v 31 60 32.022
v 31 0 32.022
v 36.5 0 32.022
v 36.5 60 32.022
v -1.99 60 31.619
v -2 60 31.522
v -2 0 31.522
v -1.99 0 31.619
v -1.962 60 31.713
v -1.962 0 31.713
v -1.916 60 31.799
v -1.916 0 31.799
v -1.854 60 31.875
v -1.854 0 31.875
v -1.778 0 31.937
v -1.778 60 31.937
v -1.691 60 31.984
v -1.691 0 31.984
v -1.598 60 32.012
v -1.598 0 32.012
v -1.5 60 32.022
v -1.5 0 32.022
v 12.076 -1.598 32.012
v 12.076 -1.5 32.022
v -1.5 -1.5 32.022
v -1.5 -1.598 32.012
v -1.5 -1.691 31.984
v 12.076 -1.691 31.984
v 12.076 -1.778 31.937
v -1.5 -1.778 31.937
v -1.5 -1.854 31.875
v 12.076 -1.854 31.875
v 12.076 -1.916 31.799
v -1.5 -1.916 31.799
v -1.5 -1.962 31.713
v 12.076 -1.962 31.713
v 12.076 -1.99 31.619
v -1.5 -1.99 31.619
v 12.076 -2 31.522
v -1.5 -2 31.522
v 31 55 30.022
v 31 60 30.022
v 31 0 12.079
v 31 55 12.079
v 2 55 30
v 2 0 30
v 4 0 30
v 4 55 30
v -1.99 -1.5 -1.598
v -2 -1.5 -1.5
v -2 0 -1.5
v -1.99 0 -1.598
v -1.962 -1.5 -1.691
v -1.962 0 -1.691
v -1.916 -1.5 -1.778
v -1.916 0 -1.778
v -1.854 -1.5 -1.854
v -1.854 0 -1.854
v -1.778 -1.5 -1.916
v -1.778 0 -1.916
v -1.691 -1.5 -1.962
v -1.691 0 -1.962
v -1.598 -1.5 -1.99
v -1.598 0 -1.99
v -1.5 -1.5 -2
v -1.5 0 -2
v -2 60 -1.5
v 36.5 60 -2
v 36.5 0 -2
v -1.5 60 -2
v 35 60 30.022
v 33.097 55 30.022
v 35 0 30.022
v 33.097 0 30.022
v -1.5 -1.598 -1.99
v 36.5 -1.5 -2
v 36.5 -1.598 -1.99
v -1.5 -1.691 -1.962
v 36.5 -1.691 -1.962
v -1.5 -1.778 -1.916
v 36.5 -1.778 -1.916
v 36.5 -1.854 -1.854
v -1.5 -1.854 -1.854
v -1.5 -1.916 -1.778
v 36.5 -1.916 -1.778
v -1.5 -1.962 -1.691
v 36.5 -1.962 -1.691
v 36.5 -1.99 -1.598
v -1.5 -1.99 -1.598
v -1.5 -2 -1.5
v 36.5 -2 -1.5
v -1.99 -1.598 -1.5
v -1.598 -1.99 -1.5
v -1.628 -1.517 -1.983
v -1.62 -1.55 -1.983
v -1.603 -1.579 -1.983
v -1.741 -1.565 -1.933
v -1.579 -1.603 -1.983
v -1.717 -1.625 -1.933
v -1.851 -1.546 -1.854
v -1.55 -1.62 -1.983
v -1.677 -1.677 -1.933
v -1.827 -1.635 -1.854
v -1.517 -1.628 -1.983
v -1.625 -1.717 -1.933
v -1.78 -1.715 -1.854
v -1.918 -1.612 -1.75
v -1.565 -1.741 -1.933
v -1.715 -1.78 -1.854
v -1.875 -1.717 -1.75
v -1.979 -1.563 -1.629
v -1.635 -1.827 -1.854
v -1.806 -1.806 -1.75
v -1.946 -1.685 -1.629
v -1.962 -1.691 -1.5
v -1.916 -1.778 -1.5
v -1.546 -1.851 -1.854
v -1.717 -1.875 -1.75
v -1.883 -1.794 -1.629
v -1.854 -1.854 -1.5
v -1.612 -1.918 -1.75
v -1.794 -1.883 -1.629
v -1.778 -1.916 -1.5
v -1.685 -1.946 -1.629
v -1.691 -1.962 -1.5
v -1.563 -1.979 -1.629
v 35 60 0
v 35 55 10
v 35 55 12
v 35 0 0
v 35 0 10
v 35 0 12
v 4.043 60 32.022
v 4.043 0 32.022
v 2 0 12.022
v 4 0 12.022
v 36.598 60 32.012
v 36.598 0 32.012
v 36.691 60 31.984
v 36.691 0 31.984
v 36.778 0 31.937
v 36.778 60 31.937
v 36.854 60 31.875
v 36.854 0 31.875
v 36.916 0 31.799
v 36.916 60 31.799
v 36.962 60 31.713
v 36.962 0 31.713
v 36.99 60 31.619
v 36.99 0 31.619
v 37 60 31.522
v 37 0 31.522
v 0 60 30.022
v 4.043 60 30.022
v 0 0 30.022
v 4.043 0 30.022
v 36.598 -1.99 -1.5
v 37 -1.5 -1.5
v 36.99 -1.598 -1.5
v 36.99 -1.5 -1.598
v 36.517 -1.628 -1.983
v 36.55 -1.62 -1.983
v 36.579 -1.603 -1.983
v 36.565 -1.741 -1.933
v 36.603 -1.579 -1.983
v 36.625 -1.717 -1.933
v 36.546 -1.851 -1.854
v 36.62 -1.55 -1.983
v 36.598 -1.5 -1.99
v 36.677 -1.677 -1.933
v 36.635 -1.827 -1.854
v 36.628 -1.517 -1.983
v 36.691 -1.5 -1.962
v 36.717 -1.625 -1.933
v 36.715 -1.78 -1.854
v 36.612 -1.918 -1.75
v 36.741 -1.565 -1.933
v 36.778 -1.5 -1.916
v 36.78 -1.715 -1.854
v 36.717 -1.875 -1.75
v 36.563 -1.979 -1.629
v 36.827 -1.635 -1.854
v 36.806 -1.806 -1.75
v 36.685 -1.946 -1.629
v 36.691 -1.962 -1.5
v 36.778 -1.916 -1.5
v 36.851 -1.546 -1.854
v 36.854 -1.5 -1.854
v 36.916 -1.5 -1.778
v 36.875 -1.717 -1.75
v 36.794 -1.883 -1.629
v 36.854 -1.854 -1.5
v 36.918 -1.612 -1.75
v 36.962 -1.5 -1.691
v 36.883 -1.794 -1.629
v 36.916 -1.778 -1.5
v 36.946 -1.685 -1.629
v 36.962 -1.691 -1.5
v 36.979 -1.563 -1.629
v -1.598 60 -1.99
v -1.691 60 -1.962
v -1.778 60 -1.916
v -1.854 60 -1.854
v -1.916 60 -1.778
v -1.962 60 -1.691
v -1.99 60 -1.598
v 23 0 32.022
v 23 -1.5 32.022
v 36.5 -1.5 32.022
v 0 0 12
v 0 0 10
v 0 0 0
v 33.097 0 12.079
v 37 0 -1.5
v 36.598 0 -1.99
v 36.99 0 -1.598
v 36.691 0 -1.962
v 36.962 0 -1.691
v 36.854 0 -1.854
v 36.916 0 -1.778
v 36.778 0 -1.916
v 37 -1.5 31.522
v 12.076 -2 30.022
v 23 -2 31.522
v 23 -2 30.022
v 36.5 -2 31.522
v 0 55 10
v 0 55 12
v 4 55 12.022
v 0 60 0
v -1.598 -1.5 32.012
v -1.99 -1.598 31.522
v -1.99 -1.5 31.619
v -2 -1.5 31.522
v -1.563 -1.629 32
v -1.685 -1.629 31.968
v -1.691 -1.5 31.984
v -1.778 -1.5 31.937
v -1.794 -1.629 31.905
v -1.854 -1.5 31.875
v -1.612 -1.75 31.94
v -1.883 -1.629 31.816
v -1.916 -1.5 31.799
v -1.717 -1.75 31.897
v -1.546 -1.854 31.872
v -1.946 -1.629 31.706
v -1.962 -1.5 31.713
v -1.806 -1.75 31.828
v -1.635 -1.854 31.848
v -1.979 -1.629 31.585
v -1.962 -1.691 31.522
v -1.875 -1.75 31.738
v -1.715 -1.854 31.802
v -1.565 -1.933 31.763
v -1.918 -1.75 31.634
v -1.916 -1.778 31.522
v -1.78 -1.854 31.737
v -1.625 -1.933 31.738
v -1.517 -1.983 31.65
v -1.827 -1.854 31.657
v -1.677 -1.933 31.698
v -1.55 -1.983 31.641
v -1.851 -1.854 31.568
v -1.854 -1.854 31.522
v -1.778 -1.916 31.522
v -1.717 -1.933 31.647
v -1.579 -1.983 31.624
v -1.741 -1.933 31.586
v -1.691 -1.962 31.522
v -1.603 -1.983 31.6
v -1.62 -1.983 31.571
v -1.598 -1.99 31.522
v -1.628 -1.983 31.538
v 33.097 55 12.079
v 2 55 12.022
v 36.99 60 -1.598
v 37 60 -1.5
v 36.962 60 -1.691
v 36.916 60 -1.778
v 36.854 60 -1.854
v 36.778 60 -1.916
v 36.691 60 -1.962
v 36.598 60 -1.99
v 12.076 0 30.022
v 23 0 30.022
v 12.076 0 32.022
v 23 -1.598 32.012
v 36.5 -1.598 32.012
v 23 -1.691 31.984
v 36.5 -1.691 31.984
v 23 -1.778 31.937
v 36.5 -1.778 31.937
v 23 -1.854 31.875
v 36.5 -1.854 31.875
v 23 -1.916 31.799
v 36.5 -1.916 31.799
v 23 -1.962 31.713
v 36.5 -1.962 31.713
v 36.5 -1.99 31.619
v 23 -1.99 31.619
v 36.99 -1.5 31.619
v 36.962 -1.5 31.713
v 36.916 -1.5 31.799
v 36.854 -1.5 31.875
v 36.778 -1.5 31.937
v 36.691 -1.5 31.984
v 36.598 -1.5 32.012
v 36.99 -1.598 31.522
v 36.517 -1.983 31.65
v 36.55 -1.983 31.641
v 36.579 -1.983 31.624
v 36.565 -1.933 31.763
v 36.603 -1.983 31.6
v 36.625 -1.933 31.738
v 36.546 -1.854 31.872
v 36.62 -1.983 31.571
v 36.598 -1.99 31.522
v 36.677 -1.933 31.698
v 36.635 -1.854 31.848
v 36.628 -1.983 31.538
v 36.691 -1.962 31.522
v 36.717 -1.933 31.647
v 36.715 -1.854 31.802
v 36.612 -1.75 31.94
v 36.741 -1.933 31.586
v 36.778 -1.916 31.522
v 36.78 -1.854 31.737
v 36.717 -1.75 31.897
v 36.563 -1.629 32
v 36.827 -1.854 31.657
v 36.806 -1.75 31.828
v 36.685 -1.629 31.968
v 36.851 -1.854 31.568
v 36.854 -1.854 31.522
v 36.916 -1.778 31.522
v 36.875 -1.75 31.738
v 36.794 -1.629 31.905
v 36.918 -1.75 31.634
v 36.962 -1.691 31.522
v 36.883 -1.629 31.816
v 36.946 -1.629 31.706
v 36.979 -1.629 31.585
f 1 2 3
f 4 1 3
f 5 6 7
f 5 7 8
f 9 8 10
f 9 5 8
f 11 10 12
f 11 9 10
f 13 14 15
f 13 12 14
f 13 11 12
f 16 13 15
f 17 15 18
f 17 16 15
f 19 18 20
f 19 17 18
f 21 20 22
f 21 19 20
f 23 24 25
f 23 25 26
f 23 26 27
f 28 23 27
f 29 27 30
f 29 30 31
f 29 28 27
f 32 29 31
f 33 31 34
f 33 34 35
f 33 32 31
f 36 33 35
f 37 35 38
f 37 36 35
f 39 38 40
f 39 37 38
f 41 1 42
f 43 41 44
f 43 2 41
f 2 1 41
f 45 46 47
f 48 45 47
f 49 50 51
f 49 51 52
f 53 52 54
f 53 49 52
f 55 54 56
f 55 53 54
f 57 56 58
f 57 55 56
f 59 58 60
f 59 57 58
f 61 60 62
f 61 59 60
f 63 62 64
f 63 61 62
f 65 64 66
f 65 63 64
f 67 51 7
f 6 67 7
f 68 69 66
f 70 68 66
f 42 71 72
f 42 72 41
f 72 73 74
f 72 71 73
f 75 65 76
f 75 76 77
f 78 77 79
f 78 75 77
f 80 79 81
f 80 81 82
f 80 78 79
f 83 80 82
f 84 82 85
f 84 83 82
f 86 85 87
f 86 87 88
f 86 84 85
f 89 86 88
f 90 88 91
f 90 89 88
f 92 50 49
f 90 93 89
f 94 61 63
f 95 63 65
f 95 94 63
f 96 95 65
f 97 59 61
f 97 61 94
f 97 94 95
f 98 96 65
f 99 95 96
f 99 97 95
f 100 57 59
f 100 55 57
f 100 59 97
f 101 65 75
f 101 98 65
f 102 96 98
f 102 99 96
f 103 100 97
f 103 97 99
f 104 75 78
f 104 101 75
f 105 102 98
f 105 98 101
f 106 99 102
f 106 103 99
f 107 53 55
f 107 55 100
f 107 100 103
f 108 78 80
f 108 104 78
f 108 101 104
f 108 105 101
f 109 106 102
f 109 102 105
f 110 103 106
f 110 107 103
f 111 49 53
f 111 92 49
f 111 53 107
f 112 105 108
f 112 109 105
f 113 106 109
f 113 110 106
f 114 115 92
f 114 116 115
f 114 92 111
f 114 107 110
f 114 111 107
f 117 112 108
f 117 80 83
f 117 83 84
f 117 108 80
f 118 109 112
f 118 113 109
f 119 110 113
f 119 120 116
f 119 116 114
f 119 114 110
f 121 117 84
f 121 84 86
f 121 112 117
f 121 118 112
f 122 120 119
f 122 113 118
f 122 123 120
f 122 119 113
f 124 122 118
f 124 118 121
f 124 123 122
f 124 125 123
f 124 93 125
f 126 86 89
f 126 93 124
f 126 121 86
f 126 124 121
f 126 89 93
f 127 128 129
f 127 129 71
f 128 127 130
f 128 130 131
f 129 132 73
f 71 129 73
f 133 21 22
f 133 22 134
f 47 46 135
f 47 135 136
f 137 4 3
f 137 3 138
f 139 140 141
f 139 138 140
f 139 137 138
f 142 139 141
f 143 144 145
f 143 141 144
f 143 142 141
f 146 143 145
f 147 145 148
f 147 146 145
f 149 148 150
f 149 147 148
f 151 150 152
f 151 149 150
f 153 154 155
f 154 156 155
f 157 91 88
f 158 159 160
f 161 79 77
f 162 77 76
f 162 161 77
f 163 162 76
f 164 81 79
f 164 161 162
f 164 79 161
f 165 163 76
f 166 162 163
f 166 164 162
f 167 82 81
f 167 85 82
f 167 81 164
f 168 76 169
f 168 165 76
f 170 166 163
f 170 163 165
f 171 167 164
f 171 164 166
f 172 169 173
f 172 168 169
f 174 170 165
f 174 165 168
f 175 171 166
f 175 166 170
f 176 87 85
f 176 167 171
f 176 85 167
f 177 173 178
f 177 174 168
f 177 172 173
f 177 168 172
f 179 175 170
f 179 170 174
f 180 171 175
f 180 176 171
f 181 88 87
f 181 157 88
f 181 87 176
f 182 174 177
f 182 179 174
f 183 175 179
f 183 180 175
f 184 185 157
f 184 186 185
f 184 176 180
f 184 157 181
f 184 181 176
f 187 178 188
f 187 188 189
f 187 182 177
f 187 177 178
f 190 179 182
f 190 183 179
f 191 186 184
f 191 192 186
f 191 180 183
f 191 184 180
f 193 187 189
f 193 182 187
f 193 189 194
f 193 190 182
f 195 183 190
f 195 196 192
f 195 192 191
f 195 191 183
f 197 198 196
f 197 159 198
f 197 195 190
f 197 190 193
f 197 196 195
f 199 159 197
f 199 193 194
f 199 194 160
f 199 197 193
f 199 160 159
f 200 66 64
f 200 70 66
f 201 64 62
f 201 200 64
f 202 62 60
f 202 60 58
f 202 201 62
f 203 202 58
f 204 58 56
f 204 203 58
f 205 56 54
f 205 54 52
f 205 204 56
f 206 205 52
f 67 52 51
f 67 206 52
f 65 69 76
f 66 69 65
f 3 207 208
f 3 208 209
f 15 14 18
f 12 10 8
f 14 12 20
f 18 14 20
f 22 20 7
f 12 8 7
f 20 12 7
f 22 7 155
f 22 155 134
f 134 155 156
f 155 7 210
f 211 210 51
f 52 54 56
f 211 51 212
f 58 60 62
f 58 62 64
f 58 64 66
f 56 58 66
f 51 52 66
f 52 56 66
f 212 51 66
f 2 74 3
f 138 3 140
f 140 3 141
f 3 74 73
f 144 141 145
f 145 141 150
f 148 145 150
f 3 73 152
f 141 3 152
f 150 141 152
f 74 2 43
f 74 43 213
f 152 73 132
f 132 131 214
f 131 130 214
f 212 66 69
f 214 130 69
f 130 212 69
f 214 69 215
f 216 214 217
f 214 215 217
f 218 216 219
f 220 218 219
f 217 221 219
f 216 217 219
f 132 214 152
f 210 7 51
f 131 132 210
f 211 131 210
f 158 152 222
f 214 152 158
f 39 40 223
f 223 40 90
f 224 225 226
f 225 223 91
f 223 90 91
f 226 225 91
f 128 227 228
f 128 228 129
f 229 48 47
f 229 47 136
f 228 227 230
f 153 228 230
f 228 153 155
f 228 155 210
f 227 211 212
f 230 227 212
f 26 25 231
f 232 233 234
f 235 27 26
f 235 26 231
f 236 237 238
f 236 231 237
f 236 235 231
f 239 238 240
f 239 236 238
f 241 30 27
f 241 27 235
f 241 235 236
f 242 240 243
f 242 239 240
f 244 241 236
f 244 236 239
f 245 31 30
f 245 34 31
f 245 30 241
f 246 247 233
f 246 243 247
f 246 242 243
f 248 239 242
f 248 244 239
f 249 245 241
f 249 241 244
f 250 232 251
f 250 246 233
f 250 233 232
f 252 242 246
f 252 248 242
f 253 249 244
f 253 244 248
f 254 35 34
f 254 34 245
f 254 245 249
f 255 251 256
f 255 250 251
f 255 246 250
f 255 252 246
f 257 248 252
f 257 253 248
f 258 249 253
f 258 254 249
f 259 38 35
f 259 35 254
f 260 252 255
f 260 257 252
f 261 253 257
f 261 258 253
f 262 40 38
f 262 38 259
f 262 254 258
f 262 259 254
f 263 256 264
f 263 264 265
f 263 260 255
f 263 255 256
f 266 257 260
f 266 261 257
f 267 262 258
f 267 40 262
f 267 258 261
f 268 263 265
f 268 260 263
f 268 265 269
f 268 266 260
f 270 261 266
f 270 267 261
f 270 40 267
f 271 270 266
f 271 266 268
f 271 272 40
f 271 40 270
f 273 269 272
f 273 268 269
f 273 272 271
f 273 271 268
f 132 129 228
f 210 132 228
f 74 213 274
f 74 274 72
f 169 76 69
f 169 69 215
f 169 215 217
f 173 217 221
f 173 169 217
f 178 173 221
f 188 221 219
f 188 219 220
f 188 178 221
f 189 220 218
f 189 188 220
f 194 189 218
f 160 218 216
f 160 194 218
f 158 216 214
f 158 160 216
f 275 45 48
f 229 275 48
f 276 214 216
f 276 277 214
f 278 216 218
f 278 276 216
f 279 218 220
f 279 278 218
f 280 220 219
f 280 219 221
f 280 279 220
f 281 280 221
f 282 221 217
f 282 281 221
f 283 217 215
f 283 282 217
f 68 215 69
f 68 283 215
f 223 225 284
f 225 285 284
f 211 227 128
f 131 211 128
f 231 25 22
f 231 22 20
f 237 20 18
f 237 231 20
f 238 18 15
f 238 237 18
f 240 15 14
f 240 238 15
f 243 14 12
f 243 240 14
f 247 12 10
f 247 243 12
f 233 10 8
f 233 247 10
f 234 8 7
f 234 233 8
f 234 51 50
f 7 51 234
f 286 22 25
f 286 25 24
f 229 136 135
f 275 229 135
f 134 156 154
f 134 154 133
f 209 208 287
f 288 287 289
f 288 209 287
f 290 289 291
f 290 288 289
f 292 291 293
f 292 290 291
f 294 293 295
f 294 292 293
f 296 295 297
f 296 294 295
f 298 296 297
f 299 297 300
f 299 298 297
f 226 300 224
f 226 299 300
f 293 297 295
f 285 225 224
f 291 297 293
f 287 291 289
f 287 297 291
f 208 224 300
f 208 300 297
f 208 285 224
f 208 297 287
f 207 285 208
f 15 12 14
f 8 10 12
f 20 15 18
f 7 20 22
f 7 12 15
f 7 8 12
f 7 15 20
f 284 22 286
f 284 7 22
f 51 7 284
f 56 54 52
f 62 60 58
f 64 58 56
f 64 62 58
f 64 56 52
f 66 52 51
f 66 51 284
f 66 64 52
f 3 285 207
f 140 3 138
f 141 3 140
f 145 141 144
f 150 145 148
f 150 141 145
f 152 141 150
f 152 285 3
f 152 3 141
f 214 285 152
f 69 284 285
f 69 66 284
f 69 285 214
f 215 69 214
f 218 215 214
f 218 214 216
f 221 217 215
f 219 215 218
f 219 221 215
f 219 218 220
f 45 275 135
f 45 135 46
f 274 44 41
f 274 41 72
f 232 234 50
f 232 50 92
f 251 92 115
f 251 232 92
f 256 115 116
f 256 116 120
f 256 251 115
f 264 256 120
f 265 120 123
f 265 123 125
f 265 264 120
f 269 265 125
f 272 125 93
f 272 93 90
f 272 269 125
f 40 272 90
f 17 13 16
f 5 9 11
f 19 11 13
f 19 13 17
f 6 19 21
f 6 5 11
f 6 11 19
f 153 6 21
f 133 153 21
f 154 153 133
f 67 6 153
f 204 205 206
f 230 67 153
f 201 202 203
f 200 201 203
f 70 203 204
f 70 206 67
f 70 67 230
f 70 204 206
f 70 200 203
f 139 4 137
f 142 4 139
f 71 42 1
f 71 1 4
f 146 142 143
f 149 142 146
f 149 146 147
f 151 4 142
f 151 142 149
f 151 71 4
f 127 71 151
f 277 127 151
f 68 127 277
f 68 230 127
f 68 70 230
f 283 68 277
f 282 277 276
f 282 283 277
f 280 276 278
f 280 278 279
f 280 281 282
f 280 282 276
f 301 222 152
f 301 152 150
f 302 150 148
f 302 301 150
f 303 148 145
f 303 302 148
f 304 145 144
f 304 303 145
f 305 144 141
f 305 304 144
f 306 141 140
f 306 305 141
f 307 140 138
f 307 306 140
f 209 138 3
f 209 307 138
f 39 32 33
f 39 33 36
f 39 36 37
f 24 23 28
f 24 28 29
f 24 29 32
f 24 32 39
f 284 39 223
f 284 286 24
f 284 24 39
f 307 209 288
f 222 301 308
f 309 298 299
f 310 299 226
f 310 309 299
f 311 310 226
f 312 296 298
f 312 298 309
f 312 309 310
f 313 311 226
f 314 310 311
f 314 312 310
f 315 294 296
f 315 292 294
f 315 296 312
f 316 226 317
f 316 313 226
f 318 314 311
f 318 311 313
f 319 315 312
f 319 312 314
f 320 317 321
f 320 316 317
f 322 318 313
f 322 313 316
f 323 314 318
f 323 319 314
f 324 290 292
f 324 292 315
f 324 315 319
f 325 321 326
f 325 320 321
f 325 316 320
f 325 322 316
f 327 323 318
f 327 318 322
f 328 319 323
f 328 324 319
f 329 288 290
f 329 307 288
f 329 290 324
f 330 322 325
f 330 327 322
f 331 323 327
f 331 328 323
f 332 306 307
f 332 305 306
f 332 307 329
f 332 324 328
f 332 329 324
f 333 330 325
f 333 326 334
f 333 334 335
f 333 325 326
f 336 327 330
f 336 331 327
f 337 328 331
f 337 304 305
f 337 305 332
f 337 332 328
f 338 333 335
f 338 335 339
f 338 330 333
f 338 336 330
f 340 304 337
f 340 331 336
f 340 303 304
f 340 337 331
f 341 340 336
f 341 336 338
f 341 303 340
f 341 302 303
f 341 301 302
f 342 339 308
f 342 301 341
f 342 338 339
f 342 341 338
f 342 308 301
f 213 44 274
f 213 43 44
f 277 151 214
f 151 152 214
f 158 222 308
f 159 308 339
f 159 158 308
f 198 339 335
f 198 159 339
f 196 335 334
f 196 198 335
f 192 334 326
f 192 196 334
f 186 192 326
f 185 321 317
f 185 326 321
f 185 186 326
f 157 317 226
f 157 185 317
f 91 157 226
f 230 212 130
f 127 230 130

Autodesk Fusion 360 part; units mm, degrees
sketch "Esquisse1" plane through (0, 0, 0) normal (0, 1, 0) x (1, 0, 0)
  line L0 (0, 0) -> (35, 0)
  line L1 (35, 0) -> (35, -10)
  line L2 (0, -10) -> (0, 0)
  line L3 (35, -10) -> (35, -30.0216)
  line L4 (35, -30.0216) -> (0, -30.0216)
  line L5 (0, -30.0216) -> (0, -10)
  line L6 (4, -30.0216) -> (4, -12.0216)
  line L7 (31, -30.0216) -> (31, -12.0794)
  line L8 (23, -32.0216) -> (12.0758, -32.0216)
  line L9 (12.0758, -32.0216) -> (12.0758, -30.0216)
  line L10 (12.0758, -30.0216) -> (23, -30.0216)
  line L11 (23, -30.0216) -> (23, -32.0216)
  line L12 (-2, -32.0216) -> (37, -32.0216)
  line L13 (37, -32.0216) -> (37, 2)
  line L14 (37, 2) -> (-2, 2)
  line L15 (-2, 2) -> (-2, -32.0216)
  line L16 (2, -30) -> (4, -30)
  line L17 (4, -30) -> (4, -12.0216)
  line L18 (4, -12.0216) -> (2, -12.0216)
  line L19 (2, -12.0216) -> (2, -30)
  line L20 (33.0971, -30.0216) -> (31, -30.0216)
  line L21 (31, -30.0216) -> (31, -12.0794)
  line L22 (31, -12.0794) -> (33.0971, -12.0794)
  line L23 (33.0971, -12.0794) -> (33.0971, -30.0216)
  line L24 (35, -10) -> (35, -12)
  line L25 (0, -12) -> (0, -10)
  line L26 (35, -12) -> (0, -12)
  line L27 (0, -12) -> (0, -10)
  line L28 (0, -10) -> (35, -10)
  line L29 (35, -10) -> (35, -12)
  line L30 (4.0433, -32.0216) -> (31, -32.0216)
  line L31 (31, -32.0216) -> (31, -30.0216)
  line L32 (31, -30.0216) -> (4.0433, -30.0216)
  line L33 (4.0433, -30.0216) -> (4.0433, -32.0216)
extrude "Extrusion2" add sketch "Esquisse1" against normal blind 2 contours L0 L1 L2 L3 L4 L5 L12 L13 L14 L15 L20 L24 L25 L27 L29 L31 L33 | L0 L1 L2 L28 | L3 L5 L24 L25 L26 L27 L28 L29 | L6 L16 L17 L18 L19 | L3 L4 L5 L7 L10 L21 L22 L23 L26 L32 | L4 L7 L20 L21 L22 L23 | L4 L9 L12 L30 L32 L33 | L4 L11 L12 L30 L31 L32 makes body 1
extrude "Extrusion3" add sketch "Esquisse1" along normal blind 60 separate body contours L0 L1 L2 L3 L4 L5 L12 L13 L14 L15 L20 L24 L25 L27 L29 L31 L33 makes body 2
extrude "Extrusion4" add sketch "Esquisse1" along normal blind 55 contours L3 L5 L24 L25 L26 L27 L28 L29 | L6 L16 L17 L18 L19 | L4 L7 L20 L21 L22 L23 bodies 2 makes body 3 at (2, 18.3333, 18.0144)
fillet "Congé1" radius 0.5 4 edges at (-2, -1, 32.0216) (37, -1, 32.0216) (-2, 30, 32.0216) (37, 30, 32.0216) on bodies 1 2
fillet "Congé2" radius 0.5 11 edges at (5.2879, -2, 32.0216) (-1.8536, -2, 31.8752) (-2, -2, 14.7608) (37, -2, 14.7608) (36.8536, -2, 31.8752) (29.75, -2, 32.0216) (-2, -1, -2) (17.5, -2, -2) (37, -1, -2) (-2, 30, -2) (37, 30, -2) on bodies 1 2
